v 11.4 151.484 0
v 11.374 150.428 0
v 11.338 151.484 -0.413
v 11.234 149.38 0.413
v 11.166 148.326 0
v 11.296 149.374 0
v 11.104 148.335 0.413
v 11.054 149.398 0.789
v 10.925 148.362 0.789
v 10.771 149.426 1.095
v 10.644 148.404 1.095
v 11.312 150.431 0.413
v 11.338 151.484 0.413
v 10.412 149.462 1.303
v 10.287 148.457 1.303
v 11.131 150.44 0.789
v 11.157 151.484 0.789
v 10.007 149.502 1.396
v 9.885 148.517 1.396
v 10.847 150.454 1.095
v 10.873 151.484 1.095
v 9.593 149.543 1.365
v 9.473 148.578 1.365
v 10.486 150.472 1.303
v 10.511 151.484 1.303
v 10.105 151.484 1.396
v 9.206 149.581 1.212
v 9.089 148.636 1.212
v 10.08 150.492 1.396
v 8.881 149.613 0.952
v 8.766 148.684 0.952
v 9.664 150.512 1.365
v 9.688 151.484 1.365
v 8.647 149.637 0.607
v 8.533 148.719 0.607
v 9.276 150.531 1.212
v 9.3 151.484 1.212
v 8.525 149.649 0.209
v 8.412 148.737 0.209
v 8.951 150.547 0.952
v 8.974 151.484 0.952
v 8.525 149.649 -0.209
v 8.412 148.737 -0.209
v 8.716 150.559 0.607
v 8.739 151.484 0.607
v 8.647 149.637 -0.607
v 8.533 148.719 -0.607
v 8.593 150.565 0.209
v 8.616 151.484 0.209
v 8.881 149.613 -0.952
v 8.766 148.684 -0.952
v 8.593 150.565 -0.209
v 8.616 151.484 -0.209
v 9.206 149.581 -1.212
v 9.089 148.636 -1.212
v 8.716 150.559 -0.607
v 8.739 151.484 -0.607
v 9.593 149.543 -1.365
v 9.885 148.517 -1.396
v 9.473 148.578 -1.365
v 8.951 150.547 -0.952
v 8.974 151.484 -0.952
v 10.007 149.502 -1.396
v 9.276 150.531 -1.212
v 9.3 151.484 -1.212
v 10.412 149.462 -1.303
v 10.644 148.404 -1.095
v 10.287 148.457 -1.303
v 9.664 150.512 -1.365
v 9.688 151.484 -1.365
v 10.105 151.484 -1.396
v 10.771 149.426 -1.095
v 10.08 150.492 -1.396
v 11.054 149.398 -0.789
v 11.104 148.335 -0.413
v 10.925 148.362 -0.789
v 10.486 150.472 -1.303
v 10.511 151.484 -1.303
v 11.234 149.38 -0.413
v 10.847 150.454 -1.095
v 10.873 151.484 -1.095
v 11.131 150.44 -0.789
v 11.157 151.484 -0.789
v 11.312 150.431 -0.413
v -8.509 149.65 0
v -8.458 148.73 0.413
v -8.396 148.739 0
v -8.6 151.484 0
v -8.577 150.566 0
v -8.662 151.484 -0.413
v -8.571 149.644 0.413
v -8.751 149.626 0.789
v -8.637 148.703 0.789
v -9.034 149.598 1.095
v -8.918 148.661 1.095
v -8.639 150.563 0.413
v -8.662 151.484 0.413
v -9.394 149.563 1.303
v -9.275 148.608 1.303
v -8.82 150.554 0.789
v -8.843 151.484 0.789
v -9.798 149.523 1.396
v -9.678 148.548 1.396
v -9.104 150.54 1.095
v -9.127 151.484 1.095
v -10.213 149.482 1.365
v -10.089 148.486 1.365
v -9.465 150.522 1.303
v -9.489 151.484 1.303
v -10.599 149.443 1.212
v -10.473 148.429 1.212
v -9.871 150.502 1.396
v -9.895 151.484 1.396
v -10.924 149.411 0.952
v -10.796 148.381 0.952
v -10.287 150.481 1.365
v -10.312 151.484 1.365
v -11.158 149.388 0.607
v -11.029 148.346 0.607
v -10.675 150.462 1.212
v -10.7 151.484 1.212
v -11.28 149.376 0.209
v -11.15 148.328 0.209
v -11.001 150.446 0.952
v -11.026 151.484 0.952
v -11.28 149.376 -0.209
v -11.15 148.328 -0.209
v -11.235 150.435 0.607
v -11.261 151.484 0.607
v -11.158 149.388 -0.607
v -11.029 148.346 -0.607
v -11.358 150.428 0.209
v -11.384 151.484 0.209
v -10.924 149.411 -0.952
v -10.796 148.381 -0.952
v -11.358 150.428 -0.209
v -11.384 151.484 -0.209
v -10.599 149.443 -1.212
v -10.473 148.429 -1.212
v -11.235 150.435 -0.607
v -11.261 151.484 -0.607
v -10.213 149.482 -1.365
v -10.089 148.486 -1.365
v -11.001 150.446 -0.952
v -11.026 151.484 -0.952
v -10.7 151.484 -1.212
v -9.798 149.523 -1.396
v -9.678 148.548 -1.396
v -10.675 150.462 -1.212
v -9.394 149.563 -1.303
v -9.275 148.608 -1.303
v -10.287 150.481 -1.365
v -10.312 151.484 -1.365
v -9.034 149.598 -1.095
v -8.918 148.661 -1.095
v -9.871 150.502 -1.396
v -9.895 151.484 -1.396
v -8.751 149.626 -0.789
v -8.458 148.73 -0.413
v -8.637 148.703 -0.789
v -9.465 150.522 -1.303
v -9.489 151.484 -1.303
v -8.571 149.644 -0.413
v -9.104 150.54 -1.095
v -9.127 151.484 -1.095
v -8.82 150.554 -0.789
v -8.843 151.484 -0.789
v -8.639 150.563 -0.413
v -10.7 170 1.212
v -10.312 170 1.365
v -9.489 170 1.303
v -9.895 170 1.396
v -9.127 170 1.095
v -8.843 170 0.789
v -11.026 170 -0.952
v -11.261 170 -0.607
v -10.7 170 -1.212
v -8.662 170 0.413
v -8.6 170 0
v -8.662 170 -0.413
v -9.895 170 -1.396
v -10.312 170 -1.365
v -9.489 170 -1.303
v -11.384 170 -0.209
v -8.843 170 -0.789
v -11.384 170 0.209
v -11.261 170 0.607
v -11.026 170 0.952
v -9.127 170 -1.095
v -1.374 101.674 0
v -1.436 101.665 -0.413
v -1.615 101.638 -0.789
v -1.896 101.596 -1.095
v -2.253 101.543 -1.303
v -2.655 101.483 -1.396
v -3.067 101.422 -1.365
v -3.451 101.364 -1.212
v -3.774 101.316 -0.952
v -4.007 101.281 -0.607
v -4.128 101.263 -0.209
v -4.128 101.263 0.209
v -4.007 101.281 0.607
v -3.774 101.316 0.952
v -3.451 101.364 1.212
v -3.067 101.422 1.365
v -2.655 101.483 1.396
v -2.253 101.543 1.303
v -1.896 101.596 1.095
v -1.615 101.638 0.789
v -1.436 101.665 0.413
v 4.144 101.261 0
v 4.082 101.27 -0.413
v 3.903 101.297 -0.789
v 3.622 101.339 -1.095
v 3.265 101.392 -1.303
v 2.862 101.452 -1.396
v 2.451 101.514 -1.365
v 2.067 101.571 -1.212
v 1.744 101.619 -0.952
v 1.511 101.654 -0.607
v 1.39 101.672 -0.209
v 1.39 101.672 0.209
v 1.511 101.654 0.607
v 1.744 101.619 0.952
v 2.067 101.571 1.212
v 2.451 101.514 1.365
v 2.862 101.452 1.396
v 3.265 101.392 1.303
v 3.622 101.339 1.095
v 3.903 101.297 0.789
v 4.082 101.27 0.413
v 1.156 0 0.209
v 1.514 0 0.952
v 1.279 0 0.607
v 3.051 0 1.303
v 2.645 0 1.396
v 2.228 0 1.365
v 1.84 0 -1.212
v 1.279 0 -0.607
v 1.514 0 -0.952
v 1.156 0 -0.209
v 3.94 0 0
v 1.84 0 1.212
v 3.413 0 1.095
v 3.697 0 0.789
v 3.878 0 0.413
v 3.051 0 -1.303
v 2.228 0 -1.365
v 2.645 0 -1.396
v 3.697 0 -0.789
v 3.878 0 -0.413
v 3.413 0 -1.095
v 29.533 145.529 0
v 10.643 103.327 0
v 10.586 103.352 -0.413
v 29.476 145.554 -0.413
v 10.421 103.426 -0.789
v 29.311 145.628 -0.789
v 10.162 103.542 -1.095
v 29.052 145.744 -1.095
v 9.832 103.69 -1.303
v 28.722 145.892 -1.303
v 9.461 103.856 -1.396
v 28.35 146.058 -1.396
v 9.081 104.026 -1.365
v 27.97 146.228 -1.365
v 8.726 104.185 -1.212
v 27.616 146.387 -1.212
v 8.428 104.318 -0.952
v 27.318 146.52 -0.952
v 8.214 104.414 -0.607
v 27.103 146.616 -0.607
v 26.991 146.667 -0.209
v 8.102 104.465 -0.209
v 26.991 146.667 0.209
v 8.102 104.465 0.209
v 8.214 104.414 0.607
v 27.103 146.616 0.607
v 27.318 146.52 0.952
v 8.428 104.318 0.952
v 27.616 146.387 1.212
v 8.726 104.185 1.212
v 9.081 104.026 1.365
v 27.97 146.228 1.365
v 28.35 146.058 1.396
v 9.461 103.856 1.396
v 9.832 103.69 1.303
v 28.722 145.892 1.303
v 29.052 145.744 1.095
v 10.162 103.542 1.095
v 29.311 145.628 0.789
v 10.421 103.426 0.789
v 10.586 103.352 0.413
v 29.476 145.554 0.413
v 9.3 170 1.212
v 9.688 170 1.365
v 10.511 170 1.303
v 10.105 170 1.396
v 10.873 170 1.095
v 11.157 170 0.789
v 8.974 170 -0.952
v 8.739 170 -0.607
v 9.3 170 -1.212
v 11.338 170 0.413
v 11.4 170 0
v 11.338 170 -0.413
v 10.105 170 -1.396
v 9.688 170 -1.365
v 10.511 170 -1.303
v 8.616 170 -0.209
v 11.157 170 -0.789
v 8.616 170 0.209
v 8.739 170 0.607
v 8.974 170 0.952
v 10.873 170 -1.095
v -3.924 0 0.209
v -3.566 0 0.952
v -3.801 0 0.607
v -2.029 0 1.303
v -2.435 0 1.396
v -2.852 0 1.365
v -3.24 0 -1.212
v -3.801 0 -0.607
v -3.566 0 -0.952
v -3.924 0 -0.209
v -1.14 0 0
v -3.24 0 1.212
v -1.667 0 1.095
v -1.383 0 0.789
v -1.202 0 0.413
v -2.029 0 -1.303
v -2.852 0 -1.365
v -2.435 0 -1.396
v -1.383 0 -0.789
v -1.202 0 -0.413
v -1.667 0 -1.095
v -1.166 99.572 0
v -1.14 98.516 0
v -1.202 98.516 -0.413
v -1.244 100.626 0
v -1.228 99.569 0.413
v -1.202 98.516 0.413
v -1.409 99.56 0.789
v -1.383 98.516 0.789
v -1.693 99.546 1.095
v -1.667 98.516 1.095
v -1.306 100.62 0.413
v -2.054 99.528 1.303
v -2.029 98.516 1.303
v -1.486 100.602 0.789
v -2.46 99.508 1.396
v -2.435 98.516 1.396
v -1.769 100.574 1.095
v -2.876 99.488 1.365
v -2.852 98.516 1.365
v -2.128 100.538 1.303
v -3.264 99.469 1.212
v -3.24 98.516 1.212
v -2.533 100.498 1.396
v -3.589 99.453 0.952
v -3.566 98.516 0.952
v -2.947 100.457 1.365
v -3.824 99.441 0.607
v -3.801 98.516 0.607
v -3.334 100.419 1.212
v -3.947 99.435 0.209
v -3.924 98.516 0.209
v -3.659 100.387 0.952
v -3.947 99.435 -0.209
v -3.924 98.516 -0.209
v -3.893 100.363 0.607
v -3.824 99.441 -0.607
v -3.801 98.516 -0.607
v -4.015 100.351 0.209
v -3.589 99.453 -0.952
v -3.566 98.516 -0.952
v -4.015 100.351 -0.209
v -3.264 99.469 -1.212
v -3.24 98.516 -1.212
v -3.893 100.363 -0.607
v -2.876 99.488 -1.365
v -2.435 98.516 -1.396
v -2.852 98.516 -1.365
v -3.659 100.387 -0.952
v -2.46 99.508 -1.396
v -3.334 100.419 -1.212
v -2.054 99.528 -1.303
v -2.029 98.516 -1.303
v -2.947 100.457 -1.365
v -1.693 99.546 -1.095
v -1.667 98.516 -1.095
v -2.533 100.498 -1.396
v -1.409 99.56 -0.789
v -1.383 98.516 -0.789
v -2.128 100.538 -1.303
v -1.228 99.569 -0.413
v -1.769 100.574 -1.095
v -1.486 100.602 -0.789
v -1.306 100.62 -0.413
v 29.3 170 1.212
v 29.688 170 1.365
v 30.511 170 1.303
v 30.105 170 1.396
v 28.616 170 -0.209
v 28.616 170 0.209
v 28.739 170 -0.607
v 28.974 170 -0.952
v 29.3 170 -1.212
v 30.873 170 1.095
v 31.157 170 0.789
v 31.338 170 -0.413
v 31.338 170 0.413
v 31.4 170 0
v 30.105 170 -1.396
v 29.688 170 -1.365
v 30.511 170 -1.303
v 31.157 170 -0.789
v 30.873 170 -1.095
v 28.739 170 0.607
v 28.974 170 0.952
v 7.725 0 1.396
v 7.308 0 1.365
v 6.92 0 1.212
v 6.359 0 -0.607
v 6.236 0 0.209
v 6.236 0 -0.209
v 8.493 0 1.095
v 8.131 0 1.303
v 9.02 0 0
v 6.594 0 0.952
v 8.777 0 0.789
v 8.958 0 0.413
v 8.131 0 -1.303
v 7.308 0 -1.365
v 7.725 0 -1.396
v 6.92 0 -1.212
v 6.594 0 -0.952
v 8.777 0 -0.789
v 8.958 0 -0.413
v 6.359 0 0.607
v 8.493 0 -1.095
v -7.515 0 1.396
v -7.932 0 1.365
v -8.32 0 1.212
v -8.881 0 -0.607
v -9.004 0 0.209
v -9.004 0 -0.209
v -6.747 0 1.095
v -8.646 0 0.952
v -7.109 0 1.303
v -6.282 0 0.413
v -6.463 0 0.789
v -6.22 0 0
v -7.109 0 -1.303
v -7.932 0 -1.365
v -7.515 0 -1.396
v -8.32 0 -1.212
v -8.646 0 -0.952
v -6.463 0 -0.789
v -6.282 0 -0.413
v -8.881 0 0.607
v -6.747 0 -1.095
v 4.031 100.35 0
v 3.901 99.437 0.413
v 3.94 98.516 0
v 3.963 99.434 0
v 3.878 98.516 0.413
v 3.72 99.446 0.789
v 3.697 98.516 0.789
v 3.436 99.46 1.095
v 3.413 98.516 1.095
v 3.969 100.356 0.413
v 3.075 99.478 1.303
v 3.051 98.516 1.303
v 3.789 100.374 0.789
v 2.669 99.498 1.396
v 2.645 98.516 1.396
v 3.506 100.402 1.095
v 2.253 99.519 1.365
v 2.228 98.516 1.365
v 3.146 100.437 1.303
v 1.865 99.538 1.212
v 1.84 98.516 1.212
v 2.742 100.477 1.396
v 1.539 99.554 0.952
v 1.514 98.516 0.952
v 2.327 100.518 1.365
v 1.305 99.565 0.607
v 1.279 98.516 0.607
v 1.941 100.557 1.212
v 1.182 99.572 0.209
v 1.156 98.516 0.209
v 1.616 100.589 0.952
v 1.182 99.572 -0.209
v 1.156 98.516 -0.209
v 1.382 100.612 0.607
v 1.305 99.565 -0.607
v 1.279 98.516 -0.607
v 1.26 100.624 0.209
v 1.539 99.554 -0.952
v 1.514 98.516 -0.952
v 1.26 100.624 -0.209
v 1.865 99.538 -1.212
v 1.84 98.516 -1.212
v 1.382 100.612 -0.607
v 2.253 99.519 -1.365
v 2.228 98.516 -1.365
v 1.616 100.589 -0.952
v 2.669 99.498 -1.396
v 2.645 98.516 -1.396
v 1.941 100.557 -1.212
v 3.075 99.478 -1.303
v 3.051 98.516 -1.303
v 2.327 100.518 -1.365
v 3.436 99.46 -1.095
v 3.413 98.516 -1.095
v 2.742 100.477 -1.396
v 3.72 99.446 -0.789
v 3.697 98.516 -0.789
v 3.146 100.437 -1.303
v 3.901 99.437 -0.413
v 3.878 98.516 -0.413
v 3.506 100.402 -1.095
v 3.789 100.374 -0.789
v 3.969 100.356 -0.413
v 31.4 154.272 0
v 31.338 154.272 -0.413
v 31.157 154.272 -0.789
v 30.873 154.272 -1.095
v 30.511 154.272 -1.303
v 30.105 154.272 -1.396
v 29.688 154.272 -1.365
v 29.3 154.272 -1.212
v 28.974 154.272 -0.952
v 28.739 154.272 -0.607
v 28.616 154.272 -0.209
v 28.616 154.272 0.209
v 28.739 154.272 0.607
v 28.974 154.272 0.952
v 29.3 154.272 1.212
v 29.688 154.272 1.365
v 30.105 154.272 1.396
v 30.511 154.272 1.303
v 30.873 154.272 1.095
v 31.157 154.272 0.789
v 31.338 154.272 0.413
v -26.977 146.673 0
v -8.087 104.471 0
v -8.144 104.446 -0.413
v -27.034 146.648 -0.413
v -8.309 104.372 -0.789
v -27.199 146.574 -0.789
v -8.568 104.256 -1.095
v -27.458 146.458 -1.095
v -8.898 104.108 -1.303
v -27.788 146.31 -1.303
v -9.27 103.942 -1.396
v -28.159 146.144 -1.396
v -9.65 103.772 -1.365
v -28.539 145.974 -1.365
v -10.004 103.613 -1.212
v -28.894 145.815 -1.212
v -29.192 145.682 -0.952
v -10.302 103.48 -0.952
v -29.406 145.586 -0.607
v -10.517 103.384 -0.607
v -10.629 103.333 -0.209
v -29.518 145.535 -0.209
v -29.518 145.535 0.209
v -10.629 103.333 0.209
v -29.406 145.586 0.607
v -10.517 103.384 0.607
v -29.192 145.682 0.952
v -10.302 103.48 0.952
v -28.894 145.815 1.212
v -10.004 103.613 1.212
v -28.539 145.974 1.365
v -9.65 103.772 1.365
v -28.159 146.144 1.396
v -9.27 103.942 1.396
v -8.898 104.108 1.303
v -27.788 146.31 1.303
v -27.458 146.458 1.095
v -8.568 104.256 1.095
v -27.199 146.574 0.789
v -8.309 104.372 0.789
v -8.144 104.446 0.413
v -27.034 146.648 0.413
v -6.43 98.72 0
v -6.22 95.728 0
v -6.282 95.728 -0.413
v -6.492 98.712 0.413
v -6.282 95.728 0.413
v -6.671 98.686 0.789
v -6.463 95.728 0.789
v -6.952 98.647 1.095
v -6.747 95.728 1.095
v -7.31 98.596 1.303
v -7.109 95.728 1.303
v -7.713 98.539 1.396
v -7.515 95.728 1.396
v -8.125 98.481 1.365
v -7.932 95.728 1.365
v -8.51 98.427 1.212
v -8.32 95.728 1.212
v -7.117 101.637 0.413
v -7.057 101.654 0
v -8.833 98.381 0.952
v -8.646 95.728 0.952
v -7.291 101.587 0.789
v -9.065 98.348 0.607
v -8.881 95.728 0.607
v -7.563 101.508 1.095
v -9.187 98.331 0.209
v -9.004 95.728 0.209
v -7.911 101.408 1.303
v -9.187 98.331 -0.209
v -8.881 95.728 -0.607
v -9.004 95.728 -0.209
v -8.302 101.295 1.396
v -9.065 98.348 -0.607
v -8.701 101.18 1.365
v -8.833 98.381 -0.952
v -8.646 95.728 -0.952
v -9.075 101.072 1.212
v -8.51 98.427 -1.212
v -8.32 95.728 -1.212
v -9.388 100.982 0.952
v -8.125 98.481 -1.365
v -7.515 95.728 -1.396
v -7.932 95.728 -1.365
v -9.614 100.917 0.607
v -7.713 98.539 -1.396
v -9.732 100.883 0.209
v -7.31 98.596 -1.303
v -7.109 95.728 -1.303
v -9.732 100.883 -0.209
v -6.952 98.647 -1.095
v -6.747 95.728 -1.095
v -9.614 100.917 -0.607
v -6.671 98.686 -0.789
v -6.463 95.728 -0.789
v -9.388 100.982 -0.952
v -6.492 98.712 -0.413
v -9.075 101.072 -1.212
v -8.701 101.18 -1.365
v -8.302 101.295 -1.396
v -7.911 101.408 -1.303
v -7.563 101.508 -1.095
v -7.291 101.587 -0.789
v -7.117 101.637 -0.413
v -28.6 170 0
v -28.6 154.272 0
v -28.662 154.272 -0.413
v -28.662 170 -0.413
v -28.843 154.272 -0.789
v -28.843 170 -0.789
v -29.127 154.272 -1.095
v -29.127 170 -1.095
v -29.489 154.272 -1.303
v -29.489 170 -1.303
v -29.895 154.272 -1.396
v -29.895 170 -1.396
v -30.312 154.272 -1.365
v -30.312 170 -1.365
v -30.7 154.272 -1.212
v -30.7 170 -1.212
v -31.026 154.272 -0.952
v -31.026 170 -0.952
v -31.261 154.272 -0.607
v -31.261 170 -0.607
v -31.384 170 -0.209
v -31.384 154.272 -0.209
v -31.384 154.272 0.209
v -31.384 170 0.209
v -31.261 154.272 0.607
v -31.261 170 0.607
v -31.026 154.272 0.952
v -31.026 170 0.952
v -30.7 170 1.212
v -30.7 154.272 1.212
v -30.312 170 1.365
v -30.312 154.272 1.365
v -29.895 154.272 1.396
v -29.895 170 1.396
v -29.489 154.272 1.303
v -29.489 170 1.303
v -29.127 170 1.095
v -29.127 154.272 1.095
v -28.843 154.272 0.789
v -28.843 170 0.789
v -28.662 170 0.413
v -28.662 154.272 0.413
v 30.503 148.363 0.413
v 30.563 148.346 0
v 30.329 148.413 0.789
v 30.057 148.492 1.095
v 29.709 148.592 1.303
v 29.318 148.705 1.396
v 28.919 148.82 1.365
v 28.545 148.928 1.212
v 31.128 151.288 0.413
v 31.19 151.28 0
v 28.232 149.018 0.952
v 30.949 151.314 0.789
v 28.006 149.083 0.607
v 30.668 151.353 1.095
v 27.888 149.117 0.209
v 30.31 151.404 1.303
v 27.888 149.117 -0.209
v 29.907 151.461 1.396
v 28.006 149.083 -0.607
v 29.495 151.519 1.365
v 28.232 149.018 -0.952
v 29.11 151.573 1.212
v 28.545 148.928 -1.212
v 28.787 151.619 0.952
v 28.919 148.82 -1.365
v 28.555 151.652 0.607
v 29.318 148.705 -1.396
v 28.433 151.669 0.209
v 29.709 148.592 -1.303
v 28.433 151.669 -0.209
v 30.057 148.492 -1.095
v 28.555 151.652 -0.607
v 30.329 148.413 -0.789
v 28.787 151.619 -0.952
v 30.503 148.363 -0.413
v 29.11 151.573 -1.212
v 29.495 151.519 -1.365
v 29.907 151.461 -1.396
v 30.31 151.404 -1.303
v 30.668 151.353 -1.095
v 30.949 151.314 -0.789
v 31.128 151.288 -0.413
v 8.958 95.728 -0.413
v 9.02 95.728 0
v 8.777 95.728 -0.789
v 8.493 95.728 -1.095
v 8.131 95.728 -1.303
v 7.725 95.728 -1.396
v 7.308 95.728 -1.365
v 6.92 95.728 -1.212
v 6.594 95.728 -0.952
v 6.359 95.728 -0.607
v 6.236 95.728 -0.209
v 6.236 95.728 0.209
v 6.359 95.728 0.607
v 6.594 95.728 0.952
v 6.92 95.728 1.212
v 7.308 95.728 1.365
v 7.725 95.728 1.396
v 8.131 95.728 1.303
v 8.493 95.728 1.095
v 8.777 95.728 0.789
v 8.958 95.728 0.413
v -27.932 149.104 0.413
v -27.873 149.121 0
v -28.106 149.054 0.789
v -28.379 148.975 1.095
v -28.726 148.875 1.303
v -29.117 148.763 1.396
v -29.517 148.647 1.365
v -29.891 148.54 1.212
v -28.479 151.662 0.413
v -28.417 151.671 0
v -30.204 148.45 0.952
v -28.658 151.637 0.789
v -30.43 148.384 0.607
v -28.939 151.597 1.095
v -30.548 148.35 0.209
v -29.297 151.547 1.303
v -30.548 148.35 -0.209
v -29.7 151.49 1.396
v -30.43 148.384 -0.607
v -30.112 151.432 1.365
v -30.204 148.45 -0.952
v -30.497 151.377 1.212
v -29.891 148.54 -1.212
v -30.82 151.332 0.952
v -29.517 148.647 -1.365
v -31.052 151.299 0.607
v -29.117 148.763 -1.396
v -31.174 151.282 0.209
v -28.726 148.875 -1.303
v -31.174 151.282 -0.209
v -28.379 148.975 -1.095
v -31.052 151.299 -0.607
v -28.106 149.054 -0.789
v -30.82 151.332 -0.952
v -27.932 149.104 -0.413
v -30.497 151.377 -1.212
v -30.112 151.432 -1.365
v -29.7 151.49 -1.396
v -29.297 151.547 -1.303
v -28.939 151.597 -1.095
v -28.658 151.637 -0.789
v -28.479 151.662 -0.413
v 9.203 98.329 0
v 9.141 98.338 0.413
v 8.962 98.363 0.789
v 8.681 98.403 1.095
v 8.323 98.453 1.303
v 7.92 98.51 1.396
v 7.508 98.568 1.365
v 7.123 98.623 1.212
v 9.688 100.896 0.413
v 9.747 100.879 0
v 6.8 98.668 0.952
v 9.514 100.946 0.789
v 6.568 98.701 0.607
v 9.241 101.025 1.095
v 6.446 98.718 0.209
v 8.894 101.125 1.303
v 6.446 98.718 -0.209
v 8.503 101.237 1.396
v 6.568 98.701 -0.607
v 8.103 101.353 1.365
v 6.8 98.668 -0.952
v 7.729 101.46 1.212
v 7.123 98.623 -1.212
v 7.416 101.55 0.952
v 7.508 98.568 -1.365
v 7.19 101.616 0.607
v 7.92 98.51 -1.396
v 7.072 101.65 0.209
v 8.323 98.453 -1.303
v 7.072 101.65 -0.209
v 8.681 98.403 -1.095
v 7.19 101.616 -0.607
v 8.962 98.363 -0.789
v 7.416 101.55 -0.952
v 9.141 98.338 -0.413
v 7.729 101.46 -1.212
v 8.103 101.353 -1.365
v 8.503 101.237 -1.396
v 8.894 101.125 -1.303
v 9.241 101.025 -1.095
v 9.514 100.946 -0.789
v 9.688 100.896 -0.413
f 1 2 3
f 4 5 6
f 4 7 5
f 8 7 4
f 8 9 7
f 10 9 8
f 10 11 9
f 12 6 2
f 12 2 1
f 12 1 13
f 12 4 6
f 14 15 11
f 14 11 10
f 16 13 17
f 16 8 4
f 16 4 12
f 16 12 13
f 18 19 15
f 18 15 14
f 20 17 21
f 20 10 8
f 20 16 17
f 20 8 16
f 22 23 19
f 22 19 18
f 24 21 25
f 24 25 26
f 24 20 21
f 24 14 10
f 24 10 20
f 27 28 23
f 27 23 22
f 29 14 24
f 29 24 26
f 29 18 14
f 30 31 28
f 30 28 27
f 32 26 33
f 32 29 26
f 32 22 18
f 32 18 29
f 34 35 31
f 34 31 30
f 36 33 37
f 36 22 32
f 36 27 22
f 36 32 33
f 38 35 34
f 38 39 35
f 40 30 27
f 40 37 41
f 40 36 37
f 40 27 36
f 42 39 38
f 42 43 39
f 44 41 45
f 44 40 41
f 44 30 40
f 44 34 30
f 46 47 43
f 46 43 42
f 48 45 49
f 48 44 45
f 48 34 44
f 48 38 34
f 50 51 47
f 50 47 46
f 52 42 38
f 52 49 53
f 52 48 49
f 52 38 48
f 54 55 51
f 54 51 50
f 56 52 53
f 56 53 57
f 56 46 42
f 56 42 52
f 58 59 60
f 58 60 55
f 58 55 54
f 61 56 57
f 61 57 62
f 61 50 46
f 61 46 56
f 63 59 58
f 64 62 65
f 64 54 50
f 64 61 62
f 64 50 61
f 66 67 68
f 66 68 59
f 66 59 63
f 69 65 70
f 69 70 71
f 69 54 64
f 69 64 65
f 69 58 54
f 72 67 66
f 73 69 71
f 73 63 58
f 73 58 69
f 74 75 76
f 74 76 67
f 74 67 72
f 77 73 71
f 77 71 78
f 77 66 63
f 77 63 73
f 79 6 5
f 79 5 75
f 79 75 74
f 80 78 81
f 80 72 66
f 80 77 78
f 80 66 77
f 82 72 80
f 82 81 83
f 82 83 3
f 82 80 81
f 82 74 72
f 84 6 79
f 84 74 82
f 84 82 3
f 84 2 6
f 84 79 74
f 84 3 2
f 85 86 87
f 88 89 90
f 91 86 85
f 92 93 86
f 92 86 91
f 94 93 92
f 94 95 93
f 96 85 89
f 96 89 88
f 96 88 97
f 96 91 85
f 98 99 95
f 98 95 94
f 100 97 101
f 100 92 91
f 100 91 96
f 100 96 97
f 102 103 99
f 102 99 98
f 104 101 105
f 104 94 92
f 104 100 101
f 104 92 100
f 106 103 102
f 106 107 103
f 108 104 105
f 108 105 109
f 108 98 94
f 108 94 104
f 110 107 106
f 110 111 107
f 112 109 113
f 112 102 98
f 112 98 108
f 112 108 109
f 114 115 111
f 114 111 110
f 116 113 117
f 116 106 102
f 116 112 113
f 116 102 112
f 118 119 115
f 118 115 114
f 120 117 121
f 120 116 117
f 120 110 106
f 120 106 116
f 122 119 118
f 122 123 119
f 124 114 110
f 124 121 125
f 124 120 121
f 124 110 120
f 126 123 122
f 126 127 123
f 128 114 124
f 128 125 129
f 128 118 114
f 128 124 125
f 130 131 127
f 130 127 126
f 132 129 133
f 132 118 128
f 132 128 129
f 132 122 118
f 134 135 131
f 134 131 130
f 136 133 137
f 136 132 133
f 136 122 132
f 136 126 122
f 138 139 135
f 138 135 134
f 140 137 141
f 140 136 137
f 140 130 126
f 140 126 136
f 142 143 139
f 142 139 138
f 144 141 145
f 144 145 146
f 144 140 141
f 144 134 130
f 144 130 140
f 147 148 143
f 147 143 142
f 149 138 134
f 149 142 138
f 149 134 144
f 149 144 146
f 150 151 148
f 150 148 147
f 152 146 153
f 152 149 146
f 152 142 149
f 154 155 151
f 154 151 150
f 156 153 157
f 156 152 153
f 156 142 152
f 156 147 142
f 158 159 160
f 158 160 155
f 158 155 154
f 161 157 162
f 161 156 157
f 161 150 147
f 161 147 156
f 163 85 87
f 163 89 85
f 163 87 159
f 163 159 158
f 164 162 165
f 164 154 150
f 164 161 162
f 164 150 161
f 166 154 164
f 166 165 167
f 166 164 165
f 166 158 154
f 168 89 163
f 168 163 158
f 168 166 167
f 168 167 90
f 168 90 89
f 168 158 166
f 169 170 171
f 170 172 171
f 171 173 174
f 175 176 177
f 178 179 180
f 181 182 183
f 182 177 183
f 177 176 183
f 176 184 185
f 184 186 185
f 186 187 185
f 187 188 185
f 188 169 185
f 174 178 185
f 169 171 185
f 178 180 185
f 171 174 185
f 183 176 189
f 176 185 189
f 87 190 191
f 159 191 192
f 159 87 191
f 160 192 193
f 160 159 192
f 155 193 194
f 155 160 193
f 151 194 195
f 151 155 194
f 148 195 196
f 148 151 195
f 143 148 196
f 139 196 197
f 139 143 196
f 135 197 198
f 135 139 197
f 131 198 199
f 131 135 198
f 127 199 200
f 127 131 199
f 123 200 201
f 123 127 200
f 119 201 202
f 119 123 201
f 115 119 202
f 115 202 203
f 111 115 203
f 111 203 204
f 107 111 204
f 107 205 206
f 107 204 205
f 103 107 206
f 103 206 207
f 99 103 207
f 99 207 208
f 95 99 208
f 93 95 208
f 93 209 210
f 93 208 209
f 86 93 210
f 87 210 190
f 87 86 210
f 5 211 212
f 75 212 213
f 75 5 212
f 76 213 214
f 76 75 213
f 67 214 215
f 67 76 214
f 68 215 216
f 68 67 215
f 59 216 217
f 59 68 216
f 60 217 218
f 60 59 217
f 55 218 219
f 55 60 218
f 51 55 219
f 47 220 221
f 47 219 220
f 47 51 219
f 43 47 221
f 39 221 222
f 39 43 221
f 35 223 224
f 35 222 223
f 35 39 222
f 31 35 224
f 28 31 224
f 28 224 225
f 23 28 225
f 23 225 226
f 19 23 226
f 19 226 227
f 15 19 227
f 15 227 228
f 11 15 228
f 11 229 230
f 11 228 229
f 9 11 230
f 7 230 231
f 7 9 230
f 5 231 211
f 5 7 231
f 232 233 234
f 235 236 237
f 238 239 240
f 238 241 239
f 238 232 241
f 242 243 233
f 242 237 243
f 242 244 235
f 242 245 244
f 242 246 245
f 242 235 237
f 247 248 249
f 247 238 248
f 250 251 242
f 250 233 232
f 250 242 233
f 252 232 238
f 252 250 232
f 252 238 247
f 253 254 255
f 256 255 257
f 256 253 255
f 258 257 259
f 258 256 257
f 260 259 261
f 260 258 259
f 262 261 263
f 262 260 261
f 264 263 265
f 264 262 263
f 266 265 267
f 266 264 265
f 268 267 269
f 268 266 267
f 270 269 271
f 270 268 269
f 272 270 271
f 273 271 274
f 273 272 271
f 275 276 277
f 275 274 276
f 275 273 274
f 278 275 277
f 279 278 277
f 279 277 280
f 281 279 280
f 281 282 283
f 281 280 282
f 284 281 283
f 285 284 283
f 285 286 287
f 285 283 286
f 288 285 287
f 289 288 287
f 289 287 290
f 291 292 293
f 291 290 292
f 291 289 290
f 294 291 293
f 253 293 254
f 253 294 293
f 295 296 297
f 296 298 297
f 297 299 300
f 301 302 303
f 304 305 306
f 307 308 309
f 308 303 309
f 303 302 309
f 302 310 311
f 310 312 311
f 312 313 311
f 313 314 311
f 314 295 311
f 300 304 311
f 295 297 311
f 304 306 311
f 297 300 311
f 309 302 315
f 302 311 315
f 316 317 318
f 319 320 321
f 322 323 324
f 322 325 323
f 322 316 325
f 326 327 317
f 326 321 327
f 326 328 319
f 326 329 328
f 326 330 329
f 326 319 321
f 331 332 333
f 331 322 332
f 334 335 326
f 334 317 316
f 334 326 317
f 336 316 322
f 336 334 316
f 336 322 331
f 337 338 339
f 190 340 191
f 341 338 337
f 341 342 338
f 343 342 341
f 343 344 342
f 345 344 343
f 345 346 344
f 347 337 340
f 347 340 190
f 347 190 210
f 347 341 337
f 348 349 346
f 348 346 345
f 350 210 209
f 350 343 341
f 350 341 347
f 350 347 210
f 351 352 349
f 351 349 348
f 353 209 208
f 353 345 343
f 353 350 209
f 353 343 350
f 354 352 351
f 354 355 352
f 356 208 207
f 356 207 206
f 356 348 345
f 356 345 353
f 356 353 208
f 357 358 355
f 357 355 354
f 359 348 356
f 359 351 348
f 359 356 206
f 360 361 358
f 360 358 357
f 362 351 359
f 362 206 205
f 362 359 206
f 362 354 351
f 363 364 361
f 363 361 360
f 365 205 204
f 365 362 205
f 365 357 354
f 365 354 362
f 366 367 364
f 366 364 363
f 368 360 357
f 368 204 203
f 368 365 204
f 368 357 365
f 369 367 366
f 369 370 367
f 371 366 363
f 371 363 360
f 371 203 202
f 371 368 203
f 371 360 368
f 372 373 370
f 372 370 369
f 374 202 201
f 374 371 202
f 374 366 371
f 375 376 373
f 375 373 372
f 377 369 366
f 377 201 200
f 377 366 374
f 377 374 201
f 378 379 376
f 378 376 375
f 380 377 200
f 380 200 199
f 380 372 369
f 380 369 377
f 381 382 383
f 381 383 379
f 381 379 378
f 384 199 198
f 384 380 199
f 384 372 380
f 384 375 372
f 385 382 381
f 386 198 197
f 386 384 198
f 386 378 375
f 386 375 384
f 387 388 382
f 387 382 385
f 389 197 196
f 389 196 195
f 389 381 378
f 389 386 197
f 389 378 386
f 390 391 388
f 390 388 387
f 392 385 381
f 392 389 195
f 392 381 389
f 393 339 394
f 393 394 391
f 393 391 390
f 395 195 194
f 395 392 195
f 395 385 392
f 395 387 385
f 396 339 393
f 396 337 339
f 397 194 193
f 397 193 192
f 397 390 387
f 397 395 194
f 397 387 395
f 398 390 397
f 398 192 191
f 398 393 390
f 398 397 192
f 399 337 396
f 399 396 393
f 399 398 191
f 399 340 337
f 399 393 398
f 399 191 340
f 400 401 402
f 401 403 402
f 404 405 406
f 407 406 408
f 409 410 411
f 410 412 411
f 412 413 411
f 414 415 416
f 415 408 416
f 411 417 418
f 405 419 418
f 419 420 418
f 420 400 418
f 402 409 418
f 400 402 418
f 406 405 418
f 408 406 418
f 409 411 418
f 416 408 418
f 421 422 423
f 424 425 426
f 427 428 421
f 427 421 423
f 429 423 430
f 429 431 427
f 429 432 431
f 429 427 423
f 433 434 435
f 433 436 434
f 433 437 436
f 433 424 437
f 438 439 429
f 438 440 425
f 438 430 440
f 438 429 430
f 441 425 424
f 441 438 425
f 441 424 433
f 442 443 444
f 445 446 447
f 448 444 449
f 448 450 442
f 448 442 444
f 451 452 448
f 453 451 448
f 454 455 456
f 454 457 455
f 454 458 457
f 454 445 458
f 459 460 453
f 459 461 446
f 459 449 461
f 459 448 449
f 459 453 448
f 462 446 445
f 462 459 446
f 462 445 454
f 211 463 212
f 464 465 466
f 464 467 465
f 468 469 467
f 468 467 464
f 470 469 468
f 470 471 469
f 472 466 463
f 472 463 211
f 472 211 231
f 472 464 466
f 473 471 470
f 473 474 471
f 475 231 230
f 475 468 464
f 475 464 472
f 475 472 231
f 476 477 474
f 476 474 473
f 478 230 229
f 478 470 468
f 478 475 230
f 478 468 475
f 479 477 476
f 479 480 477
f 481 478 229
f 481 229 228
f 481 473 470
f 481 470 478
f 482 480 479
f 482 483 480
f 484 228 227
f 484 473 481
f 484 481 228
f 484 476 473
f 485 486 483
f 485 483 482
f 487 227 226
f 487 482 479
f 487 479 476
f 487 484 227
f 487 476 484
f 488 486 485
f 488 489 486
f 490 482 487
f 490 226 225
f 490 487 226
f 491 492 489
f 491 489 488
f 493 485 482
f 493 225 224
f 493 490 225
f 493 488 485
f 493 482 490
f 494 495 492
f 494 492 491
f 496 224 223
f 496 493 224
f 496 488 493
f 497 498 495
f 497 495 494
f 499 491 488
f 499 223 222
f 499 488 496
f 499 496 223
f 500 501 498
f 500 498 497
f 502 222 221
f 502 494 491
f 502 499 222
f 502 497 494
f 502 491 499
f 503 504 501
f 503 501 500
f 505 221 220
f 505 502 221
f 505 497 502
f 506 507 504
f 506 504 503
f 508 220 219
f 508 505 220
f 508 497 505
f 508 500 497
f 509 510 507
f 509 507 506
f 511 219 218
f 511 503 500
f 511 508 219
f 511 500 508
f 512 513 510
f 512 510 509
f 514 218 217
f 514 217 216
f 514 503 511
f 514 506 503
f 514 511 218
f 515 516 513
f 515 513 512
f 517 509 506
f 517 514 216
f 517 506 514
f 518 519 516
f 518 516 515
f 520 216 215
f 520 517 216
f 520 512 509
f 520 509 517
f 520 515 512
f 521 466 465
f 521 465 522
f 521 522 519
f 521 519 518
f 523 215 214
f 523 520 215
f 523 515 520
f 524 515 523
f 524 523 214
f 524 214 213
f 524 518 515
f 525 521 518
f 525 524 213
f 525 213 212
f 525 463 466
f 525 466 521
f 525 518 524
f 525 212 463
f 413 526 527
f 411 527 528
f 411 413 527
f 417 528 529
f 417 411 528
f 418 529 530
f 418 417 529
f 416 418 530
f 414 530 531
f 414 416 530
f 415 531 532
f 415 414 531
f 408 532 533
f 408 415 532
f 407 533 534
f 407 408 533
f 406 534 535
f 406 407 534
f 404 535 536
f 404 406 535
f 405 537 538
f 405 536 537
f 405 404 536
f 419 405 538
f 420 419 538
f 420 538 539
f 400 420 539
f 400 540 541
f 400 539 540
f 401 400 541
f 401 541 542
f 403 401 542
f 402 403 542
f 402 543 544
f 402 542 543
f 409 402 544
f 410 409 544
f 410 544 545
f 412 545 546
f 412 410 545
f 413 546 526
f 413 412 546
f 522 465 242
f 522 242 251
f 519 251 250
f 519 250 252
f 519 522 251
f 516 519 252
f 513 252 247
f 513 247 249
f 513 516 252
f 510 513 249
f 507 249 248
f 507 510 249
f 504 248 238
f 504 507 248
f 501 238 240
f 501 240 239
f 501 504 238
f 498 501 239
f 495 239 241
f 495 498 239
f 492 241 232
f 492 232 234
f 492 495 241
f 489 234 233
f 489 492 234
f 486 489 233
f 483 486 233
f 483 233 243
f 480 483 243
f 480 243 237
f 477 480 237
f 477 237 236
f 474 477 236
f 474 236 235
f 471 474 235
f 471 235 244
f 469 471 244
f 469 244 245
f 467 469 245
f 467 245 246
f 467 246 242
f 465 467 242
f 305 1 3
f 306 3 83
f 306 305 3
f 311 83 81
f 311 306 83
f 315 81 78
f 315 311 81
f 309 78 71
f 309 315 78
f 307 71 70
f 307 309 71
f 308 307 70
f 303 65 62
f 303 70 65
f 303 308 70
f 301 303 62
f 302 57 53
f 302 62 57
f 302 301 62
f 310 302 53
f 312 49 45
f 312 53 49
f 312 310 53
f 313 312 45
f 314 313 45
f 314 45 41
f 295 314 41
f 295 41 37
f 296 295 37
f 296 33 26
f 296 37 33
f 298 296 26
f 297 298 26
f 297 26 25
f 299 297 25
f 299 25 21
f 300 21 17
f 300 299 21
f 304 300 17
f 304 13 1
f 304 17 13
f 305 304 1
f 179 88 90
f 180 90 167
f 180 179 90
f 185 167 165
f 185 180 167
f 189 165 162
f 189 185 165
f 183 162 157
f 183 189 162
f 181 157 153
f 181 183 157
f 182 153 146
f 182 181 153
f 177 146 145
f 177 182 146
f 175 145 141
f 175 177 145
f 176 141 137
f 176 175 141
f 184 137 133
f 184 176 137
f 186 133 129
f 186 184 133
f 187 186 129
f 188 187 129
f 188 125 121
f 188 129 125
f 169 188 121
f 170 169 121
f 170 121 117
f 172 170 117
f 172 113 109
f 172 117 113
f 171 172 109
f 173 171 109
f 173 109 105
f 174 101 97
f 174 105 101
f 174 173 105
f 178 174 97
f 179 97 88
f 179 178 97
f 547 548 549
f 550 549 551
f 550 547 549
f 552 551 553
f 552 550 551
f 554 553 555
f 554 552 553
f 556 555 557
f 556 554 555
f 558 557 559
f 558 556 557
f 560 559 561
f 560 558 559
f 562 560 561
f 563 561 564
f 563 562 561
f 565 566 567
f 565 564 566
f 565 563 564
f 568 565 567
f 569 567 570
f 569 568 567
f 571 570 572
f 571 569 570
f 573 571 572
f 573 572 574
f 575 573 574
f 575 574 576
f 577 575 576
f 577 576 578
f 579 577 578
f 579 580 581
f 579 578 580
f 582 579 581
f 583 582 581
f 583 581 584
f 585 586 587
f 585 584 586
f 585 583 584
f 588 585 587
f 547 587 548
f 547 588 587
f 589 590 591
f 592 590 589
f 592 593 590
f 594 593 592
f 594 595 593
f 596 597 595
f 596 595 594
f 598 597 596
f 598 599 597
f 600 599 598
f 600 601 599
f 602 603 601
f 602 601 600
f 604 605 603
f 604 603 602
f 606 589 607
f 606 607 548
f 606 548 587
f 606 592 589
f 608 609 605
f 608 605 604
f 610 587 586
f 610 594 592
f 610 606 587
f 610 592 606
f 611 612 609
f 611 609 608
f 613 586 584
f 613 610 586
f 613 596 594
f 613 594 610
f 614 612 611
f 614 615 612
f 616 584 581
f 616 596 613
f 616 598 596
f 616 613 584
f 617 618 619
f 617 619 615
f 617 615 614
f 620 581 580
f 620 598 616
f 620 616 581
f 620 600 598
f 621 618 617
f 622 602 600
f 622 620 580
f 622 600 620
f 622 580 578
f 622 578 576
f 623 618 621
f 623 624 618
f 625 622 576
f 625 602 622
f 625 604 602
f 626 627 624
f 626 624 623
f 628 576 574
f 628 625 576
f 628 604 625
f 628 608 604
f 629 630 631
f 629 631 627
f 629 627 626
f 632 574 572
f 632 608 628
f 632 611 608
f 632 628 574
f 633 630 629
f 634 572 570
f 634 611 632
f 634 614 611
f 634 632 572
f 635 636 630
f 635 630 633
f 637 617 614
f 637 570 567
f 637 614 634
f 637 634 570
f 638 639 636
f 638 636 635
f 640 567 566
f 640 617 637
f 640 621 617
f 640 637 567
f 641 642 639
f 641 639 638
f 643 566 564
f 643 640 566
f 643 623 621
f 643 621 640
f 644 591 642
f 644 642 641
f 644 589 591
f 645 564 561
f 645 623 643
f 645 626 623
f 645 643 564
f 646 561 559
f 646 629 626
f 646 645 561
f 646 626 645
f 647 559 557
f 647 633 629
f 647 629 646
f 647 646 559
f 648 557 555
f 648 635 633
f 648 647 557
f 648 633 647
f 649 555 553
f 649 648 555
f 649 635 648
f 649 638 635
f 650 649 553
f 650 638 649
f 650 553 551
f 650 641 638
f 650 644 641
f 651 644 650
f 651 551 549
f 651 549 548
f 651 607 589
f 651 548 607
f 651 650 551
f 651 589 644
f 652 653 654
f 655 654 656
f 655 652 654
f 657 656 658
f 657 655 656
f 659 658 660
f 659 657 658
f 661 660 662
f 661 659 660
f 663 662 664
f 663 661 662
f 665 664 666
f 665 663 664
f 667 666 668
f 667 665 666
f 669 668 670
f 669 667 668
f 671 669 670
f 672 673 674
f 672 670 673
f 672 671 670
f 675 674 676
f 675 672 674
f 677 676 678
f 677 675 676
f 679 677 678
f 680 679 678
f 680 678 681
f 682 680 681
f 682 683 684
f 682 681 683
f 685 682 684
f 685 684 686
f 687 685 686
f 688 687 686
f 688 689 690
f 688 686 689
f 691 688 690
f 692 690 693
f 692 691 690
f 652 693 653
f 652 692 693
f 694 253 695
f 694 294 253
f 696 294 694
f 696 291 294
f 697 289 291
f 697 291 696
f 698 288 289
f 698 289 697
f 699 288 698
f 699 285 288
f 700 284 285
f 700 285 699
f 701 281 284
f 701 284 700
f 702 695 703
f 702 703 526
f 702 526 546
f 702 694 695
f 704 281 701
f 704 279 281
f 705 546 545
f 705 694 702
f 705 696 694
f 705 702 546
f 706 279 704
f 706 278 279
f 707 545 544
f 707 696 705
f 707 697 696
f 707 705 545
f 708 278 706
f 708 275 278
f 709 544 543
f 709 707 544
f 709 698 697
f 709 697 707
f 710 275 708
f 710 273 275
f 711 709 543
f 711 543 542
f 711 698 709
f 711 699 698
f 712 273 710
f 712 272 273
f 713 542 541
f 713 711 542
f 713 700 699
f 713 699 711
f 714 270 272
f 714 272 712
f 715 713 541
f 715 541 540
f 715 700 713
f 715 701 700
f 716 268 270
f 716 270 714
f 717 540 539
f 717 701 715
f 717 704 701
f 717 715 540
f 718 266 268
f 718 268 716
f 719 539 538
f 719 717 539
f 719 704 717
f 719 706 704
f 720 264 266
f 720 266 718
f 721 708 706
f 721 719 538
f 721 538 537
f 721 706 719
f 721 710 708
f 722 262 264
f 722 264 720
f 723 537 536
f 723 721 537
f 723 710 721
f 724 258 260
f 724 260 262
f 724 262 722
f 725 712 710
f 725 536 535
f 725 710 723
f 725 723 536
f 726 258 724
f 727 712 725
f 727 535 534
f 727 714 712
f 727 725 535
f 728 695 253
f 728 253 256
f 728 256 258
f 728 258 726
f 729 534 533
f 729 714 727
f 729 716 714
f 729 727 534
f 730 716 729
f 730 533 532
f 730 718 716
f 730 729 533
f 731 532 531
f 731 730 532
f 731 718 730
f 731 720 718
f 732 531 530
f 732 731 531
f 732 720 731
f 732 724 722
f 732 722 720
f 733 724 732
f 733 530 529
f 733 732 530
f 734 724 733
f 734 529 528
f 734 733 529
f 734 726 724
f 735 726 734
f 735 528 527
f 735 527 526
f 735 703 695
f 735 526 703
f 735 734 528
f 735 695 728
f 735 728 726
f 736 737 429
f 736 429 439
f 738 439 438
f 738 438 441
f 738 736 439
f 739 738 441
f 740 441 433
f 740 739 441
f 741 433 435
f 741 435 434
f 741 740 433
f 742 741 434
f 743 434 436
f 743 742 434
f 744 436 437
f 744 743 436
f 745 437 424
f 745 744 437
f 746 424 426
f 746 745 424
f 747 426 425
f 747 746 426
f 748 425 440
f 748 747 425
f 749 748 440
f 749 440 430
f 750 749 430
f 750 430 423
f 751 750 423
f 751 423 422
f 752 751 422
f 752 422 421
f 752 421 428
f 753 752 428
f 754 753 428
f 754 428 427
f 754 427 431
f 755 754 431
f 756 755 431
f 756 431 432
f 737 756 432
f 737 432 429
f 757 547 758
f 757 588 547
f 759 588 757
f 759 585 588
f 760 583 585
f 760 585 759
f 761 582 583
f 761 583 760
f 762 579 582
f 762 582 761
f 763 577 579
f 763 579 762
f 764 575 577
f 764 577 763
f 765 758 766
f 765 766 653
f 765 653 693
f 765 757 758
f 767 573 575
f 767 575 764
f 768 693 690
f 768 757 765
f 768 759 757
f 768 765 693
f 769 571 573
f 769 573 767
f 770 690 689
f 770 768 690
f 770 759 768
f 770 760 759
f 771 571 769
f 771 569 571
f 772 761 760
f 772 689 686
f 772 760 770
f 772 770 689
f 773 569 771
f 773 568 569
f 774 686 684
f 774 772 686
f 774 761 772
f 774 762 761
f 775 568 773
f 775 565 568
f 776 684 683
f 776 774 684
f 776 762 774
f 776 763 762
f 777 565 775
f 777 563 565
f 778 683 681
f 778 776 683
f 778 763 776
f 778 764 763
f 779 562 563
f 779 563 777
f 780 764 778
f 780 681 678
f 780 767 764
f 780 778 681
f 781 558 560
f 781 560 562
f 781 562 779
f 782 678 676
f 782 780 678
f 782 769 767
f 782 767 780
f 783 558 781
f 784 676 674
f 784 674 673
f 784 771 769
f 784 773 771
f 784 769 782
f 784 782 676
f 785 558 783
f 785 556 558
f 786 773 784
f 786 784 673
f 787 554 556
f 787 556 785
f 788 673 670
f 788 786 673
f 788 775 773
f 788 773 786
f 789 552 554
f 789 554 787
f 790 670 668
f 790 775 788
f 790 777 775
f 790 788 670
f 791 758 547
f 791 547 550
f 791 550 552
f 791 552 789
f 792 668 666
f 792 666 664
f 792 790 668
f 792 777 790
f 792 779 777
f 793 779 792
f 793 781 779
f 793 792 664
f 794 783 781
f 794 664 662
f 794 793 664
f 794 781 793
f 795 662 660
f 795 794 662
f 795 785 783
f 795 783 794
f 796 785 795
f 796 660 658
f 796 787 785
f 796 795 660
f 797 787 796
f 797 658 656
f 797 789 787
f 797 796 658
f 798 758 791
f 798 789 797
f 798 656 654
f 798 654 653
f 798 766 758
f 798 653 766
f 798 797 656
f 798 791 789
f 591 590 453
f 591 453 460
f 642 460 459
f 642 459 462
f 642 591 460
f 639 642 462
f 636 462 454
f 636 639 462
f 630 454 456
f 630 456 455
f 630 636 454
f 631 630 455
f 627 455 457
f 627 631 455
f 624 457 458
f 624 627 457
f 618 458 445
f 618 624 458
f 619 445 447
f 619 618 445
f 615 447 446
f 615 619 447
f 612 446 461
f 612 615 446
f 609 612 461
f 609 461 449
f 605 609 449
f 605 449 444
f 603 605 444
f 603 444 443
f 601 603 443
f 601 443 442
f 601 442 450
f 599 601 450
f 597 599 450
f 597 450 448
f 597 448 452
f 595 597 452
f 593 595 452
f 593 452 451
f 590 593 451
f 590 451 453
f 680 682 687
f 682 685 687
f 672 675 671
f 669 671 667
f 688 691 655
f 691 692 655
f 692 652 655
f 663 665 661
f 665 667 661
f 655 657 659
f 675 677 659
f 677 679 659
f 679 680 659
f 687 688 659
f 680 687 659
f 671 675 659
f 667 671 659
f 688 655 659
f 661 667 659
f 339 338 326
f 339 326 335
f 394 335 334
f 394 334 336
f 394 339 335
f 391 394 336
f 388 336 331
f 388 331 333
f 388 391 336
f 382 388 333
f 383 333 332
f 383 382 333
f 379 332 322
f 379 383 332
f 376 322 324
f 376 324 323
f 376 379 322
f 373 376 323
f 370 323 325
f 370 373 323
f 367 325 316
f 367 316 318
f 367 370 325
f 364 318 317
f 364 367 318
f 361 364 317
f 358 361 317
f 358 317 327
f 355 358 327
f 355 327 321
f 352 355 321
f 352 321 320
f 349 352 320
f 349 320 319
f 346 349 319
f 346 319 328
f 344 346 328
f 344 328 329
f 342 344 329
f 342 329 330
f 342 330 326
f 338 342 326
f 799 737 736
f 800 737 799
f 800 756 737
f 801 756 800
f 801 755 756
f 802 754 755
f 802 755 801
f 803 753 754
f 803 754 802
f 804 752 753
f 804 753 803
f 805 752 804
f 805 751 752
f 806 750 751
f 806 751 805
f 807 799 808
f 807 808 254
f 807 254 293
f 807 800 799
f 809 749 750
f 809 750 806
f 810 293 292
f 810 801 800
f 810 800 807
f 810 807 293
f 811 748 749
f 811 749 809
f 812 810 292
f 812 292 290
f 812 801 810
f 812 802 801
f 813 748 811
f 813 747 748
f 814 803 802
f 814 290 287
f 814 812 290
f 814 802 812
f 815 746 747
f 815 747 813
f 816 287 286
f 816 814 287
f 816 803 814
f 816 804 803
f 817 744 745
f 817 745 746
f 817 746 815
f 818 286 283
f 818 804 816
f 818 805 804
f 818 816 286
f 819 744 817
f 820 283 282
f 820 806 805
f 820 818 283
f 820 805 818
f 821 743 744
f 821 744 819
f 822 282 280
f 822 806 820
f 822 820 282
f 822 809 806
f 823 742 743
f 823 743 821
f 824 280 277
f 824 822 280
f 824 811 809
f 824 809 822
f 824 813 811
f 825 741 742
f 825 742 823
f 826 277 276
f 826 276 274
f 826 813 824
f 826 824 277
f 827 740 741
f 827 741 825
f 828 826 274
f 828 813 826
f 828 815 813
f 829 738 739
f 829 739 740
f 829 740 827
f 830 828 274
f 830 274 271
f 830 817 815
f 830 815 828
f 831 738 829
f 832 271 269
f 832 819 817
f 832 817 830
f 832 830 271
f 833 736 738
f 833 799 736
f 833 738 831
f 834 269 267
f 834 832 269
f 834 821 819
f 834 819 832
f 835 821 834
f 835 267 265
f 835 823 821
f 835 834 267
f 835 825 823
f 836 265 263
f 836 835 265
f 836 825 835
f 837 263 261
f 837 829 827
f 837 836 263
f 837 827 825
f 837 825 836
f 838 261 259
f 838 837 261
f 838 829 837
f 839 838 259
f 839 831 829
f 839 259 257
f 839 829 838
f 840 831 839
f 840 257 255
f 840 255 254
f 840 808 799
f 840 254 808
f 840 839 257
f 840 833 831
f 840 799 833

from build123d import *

# Parameters (mm, degrees)
F4_R = 1.4
F5_R = 1.4
F6_R = 1.4
F7_R = 1.4


with BuildPart() as f8:
    # F8: sweep along a path in F0
    with BuildLine(Plane.XY) as f8_path:
        Line((-7.62, 0), (-7.62, 95.728198357))
        ThreePointArc((-7.62, 95.728198357), (-8.0611685251, 99.9057707785), (-9.3652111337, 103.8990418536))
        Line((-9.3652111337, 103.8990418536), (-28.2547888663, 146.1009581464))
        ThreePointArc((-28.2547888663, 146.1009581464), (-29.5588314749, 150.0942292215), (-30, 154.271801643))
        Line((-30, 154.271801643), (-30, 170))
    # F4 (on Front) → F8 (sweep)
    with BuildSketch(Plane.XZ):
        with Locations((-7.62, 0)):
            Circle(F4_R)
    sweep(path=f8_path.line)


with BuildPart() as f9:
    # F9: sweep along a path in F1
    with BuildLine(Plane.XY) as f9_path:
        Line((-2.54, 0), (-2.54, 98.5162120673))
        ThreePointArc((-2.54, 98.5162120673), (-2.5948144923, 99.9959333459), (-2.7589575062, 101.4675436074))
        Line((-2.7589575062, 101.4675436074), (-9.7810424938, 148.5324563926))
        ThreePointArc((-9.7810424938, 148.5324563926), (-9.9451855077, 150.0040666541), (-10, 151.4837879327))
        Line((-10, 151.4837879327), (-10, 170))
    # F5 (on Front) → F9 (sweep)
    with BuildSketch(Plane.XZ):
        with Locations((-2.54, 0)):
            Circle(F5_R)
    sweep(path=f9_path.line)


with BuildPart() as f10:
    # F10: sweep along a path in F2
    with BuildLine(Plane.XY) as f10_path:
        Line((2.54, 0), (2.54, 98.5162120673))
        ThreePointArc((2.54, 98.5162120673), (2.5948144923, 99.9959333459), (2.7589575062, 101.4675436074))
        Line((2.7589575062, 101.4675436074), (9.7810424938, 148.5324563926))
        ThreePointArc((9.7810424938, 148.5324563926), (9.9451855077, 150.0040666541), (10, 151.4837879327))
        Line((10, 151.4837879327), (10, 170))
    # F6 (on Front) → F10 (sweep)
    with BuildSketch(Plane.XZ):
        with Locations((2.54, 0)):
            Circle(F6_R)
    sweep(path=f10_path.line)


with BuildPart() as f11:
    # F11: sweep along a path in F3
    with BuildLine(Plane.XY) as f11_path:
        Line((7.62, 0), (7.62, 95.728198357))
        ThreePointArc((7.62, 95.728198357), (8.0611685251, 99.9057707785), (9.3652111337, 103.8990418536))
        Line((9.3652111337, 103.8990418536), (28.2547888663, 146.1009581464))
        ThreePointArc((28.2547888663, 146.1009581464), (29.5588314749, 150.0942292215), (30, 154.271801643))
        Line((30, 154.271801643), (30, 170))
    # F7 (on Front) → F11 (sweep)
    with BuildSketch(Plane.XZ):
        with Locations((7.62, 0)):
            Circle(F7_R)
    sweep(path=f11_path.line)


solid = Compound([f8.part, f9.part, f10.part, f11.part])
